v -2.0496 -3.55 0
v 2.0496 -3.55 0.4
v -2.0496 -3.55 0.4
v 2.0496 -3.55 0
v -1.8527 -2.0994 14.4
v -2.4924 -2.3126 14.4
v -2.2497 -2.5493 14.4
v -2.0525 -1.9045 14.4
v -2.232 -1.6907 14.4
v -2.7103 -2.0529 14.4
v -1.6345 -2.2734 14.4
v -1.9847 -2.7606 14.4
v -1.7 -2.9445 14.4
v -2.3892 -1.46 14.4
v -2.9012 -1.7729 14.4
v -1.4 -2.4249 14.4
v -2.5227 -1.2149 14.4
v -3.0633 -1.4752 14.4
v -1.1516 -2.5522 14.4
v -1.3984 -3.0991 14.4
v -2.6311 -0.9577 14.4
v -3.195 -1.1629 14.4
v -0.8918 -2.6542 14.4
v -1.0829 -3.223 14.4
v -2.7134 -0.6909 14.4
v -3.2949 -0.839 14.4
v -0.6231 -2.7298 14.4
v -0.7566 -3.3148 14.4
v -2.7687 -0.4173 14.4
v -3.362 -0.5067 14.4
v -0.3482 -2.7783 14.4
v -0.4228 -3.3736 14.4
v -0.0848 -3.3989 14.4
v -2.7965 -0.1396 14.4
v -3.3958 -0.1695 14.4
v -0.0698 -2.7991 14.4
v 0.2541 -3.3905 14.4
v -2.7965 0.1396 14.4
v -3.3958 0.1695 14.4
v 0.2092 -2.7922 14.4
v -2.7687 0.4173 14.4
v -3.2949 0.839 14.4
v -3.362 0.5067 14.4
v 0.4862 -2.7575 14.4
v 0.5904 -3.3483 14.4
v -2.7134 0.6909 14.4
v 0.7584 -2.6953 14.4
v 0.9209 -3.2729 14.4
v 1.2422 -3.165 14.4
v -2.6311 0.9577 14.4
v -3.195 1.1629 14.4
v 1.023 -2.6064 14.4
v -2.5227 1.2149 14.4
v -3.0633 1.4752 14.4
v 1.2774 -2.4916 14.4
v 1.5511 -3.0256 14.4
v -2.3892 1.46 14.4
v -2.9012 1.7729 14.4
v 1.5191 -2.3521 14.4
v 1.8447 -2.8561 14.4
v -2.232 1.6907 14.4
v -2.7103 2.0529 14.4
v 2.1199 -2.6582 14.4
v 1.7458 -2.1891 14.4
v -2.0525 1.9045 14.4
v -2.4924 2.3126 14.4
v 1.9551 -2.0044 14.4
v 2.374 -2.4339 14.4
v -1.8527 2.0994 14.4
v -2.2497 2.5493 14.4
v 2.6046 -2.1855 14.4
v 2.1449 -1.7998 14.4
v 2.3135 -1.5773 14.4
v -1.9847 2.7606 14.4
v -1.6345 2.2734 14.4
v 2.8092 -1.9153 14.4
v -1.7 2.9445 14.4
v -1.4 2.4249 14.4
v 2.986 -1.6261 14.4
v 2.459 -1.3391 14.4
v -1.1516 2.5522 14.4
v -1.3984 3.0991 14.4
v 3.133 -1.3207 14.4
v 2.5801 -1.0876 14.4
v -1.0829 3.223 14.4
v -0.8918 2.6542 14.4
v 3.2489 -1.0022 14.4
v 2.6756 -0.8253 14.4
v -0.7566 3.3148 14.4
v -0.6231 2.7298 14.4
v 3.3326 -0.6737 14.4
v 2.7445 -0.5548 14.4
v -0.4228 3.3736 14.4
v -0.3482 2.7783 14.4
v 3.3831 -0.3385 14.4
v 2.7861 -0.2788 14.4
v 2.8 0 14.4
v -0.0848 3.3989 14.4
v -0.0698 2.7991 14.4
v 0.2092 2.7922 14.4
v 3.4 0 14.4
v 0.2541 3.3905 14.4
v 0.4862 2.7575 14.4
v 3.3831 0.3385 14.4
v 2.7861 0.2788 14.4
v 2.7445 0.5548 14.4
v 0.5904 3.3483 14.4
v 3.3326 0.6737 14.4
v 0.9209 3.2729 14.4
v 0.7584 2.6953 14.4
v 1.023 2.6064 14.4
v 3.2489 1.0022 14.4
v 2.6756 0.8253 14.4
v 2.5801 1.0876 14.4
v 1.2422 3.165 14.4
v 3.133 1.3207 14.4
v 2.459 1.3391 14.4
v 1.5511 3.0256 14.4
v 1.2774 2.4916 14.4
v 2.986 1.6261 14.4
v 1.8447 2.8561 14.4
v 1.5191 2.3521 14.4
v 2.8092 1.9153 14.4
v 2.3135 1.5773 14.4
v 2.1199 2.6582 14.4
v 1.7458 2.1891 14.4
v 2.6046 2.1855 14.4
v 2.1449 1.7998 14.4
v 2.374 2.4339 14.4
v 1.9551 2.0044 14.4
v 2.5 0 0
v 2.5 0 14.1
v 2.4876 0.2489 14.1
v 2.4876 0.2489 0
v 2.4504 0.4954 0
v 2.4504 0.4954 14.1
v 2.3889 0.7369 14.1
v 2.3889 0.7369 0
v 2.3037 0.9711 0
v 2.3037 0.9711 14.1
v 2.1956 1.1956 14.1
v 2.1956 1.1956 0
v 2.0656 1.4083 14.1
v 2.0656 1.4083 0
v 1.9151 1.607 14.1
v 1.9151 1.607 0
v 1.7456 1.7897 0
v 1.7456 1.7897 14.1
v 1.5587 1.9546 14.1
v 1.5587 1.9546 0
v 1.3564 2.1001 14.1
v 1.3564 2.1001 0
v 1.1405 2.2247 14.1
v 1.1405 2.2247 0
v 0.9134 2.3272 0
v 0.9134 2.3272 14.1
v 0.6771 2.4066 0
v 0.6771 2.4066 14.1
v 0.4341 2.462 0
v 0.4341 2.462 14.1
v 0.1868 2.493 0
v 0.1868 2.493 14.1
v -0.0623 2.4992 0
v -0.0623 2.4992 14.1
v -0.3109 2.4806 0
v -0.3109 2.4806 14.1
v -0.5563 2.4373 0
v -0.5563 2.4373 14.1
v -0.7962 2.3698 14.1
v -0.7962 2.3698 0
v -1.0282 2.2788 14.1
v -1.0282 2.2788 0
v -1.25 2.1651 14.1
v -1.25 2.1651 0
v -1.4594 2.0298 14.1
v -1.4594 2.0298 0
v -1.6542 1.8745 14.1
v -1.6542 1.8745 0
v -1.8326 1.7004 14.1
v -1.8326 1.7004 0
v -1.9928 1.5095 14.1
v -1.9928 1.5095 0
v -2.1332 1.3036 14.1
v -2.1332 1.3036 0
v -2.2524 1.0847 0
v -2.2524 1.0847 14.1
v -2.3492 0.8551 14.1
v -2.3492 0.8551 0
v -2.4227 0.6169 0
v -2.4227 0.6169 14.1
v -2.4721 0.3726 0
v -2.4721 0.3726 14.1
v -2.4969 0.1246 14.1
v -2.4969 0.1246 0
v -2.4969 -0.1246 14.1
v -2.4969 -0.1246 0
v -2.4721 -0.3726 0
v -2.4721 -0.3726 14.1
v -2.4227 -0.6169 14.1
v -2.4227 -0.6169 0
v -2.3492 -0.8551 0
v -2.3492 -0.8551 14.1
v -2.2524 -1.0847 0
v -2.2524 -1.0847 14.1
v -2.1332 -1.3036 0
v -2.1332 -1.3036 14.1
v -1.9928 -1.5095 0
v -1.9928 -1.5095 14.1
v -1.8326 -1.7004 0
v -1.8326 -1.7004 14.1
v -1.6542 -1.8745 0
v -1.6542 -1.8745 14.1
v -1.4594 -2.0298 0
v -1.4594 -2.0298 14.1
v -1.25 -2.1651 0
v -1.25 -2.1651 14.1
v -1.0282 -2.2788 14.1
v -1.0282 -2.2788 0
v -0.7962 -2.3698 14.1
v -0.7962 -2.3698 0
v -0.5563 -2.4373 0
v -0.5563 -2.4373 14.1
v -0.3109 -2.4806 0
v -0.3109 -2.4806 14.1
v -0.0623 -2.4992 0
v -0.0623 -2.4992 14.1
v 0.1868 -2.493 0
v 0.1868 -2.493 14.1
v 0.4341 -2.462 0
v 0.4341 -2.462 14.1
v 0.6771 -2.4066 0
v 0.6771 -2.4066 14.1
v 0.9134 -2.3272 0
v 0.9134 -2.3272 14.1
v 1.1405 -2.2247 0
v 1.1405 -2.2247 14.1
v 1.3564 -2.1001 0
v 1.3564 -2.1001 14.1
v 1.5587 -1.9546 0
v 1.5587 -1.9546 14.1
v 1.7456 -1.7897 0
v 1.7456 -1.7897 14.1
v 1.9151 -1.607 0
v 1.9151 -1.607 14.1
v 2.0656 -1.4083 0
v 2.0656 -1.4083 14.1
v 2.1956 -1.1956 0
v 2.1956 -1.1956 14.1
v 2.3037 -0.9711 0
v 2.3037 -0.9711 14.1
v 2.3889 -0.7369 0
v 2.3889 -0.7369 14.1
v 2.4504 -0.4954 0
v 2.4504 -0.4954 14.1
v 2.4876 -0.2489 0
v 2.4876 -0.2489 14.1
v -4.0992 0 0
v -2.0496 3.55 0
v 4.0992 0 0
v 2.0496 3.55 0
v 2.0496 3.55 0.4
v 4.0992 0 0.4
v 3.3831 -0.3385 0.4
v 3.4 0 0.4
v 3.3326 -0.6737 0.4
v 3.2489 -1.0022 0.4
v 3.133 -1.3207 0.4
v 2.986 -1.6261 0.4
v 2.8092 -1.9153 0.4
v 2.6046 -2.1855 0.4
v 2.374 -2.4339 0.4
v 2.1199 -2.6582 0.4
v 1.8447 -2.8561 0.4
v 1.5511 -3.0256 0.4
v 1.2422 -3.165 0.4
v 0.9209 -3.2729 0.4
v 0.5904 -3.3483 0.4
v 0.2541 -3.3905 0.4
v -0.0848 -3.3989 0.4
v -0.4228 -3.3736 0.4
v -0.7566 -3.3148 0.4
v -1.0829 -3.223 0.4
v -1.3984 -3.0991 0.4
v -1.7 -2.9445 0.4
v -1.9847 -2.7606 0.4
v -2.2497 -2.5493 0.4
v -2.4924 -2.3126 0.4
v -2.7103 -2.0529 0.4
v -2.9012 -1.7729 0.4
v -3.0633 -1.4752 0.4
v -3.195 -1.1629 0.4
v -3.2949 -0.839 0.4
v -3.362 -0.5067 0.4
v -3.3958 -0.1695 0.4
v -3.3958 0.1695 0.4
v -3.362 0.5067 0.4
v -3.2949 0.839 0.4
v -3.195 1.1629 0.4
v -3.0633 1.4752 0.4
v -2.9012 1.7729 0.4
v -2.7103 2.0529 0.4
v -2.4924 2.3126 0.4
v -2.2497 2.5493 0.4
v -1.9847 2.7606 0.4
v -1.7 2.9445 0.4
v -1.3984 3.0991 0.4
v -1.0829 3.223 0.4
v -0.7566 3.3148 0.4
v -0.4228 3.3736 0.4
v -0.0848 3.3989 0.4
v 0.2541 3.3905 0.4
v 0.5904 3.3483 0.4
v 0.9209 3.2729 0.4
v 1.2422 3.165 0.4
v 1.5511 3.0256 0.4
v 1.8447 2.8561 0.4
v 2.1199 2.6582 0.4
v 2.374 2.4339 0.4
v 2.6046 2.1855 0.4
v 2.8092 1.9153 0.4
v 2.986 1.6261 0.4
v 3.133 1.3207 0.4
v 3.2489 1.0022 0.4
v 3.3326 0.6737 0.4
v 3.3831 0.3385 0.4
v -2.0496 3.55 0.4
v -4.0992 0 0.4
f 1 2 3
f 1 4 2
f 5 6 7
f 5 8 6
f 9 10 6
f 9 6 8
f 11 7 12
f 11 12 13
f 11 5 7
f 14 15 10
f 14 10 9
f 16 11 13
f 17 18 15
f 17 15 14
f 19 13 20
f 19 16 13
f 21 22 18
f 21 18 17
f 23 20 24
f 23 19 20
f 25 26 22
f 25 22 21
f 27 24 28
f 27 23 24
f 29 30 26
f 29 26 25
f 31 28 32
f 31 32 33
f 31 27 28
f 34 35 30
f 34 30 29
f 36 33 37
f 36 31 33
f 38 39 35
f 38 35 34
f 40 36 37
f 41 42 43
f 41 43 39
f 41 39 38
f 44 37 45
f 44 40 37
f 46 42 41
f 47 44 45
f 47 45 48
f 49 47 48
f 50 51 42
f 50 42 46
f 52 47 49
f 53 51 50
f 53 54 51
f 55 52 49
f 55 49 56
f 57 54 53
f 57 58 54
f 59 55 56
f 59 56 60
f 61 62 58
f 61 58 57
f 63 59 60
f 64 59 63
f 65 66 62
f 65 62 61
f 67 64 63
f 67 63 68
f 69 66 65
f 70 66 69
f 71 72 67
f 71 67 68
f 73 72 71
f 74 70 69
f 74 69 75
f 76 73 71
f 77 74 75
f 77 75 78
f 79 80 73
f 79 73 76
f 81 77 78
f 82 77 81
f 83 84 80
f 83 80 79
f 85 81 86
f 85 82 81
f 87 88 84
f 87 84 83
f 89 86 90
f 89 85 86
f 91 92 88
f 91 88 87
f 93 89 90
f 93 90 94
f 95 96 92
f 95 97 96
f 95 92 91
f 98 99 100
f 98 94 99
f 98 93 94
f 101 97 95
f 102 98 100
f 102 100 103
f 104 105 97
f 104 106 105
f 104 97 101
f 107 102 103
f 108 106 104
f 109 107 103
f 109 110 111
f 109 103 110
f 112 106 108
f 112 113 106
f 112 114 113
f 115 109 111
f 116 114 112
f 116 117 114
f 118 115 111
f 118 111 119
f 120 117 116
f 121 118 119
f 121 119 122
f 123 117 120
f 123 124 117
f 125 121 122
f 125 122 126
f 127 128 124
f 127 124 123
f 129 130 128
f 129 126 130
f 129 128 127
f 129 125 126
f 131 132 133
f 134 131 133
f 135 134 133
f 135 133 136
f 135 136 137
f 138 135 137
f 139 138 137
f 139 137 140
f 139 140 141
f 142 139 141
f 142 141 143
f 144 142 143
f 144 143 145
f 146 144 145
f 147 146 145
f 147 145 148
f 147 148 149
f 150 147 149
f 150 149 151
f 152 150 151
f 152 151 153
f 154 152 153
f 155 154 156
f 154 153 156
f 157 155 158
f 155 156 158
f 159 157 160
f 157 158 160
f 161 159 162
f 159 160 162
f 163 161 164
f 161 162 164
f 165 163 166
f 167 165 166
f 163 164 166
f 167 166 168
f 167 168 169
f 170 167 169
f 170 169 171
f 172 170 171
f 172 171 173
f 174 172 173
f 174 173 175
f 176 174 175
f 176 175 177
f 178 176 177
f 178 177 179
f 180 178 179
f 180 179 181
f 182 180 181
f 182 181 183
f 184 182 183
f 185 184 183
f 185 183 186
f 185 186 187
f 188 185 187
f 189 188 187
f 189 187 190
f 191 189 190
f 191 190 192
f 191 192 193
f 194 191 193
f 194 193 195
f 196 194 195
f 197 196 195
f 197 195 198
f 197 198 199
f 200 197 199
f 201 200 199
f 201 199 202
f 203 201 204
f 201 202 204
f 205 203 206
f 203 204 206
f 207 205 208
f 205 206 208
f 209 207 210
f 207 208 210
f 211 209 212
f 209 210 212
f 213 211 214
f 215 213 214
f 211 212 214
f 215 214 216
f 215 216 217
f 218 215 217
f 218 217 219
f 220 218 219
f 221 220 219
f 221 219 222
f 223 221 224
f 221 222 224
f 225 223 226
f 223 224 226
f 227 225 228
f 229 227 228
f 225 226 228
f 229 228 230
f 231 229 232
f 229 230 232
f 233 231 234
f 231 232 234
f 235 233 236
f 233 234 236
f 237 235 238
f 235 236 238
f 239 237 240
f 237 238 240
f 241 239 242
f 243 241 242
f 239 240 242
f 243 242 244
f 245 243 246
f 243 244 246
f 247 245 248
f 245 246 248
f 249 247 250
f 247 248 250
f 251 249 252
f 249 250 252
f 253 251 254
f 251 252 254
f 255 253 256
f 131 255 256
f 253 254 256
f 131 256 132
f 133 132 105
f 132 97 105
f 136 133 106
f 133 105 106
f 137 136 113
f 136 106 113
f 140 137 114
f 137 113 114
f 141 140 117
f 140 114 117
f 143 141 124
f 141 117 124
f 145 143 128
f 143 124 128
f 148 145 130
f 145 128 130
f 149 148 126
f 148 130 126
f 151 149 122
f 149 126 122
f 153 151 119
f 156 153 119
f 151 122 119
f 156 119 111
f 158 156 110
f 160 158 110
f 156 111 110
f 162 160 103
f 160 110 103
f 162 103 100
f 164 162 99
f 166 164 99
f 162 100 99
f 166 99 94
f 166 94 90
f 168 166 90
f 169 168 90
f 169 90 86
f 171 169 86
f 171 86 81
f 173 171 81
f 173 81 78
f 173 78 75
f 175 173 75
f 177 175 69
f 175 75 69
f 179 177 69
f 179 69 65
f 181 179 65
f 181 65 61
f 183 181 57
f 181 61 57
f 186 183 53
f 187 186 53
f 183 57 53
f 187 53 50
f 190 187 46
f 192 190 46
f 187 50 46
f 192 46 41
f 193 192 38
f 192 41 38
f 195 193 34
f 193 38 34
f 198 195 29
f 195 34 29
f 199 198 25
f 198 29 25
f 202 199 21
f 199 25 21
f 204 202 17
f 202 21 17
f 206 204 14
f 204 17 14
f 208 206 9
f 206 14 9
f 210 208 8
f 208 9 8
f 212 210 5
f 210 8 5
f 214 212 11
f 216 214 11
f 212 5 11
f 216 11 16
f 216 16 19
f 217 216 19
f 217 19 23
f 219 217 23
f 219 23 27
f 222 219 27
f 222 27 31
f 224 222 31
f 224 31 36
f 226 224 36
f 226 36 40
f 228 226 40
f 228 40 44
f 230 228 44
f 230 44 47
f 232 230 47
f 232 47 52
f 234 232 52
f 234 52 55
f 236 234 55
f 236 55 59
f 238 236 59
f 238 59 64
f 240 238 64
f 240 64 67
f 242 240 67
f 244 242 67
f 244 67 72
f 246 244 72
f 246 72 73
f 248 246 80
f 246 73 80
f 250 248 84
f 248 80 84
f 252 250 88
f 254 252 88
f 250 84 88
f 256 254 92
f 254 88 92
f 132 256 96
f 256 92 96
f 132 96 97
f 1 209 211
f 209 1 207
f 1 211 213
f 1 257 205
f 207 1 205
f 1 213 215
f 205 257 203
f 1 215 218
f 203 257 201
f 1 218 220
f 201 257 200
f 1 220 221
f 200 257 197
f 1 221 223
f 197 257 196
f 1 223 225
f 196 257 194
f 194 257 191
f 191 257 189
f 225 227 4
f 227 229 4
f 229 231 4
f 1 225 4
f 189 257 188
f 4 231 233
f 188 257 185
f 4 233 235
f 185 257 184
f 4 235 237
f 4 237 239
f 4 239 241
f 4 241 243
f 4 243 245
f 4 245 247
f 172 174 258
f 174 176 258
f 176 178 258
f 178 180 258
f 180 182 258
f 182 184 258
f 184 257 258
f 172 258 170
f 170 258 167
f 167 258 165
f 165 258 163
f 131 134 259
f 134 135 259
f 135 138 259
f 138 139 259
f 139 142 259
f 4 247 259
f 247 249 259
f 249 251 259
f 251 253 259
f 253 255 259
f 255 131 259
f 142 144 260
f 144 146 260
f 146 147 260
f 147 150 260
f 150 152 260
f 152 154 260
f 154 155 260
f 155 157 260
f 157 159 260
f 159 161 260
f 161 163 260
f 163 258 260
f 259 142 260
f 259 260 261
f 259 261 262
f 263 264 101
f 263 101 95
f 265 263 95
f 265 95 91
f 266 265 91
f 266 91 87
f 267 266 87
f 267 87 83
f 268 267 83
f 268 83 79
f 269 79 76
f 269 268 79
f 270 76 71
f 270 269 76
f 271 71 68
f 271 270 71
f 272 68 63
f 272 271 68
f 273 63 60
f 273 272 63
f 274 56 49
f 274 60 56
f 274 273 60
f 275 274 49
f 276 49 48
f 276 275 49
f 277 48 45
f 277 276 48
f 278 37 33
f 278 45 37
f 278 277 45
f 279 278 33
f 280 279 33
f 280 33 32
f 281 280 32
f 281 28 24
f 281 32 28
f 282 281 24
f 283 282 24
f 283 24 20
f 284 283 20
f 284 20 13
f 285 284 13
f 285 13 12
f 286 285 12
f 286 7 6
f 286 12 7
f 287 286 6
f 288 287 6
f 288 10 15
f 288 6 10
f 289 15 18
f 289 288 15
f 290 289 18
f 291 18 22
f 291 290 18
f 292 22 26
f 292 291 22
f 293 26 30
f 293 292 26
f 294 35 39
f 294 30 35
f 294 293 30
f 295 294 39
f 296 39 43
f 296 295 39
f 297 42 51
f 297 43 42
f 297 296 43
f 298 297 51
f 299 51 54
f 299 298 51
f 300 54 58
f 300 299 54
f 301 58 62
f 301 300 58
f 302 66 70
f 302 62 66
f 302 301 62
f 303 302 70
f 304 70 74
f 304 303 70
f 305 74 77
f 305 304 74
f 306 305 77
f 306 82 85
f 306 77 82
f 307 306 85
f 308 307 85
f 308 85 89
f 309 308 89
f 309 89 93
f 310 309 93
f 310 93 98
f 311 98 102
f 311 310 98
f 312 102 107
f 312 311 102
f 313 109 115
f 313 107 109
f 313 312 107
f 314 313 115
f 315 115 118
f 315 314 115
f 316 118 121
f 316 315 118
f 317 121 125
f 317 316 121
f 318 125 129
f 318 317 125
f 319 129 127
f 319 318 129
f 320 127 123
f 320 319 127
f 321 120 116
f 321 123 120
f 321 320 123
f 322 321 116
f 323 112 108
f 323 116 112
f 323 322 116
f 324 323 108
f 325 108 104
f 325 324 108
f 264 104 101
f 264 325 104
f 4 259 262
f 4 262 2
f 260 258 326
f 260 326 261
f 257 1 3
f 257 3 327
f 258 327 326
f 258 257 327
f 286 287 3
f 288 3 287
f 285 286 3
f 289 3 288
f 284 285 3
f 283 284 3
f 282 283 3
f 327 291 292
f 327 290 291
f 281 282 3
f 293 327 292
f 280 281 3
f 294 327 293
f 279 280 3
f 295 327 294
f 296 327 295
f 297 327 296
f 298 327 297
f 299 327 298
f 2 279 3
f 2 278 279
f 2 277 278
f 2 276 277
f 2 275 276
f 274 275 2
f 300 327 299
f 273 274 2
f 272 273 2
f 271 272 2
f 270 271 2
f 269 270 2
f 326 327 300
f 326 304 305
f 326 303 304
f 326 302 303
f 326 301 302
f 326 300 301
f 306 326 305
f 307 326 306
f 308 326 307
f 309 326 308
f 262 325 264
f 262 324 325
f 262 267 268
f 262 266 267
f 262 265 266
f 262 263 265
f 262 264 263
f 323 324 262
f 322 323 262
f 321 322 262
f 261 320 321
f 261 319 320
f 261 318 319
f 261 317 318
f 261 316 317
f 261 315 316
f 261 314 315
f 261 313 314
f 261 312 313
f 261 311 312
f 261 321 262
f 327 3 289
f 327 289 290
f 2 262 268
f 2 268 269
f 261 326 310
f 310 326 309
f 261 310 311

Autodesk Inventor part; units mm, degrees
ref_plane "YZ Plane" through (0, 0, 0) normal (1, 0, 0) x (0, 1, 0)
ref_plane "XZ Plane" through (0, 0, 0) normal (0, 1, 0) x (-1, 0, 0)
ref_plane "XY Plane" through (0, 0, 0) normal (0, 0, 1) x (1, 0, 0)
sketch "Sketch1" plane through (0, 0, 0) normal (0, 0, 1) x (1, 0, 0)
  line L0 (2.0496, 3.55) -> (4.0992, 0)
  line L1 (4.0992, 0) -> (2.0496, -3.55)
  line L2 (2.0496, -3.55) -> (-2.0496, -3.55)
  line L3 (-2.0496, -3.55) -> (-4.0992, 0)
  line L4 (-4.0992, 0) -> (-2.0496, 3.55)
  line L5 (-2.0496, 3.55) -> (2.0496, 3.55)
  point P0 (0, 0)
  dimension "d0" = 7.1
extrude "Extrusion1" add sketch "Sketch1" along normal blind 0.4
sketch "Sketch2" plane through (0, 0, 0.4) normal (0, 0, 1) x (1, 0, 0)
  circle A0 centre (0, 0) radius 3.4
  dimension "d3" = 6.8
extrude "Extrusion2" add sketch "Sketch2" along normal blind 14
sketch "Sketch3" plane through (0, 0, 14.4) normal (0, 0, 1) x (1, 0, 0)
  circle A0 centre (0, 0) radius 3.4 projected
  circle A1 centre (0, 0) radius 2.5
  dimension "d6" = 5
extrude "Extrusion3" cut sketch "Sketch3" against normal blind 15 contours A1
chamfer "Chamfer1" distance 0.3 angle 45 1 edges at (-2.5, 0, 14.4)
thread "Thread1" size "M5x0.8" class "6H" standard "ANSI Metric M Profile" full length
properties part number "Вытяжная заклепка_Р-Ш-М5-Ум" material "Сталь низкоуглеродистая"
